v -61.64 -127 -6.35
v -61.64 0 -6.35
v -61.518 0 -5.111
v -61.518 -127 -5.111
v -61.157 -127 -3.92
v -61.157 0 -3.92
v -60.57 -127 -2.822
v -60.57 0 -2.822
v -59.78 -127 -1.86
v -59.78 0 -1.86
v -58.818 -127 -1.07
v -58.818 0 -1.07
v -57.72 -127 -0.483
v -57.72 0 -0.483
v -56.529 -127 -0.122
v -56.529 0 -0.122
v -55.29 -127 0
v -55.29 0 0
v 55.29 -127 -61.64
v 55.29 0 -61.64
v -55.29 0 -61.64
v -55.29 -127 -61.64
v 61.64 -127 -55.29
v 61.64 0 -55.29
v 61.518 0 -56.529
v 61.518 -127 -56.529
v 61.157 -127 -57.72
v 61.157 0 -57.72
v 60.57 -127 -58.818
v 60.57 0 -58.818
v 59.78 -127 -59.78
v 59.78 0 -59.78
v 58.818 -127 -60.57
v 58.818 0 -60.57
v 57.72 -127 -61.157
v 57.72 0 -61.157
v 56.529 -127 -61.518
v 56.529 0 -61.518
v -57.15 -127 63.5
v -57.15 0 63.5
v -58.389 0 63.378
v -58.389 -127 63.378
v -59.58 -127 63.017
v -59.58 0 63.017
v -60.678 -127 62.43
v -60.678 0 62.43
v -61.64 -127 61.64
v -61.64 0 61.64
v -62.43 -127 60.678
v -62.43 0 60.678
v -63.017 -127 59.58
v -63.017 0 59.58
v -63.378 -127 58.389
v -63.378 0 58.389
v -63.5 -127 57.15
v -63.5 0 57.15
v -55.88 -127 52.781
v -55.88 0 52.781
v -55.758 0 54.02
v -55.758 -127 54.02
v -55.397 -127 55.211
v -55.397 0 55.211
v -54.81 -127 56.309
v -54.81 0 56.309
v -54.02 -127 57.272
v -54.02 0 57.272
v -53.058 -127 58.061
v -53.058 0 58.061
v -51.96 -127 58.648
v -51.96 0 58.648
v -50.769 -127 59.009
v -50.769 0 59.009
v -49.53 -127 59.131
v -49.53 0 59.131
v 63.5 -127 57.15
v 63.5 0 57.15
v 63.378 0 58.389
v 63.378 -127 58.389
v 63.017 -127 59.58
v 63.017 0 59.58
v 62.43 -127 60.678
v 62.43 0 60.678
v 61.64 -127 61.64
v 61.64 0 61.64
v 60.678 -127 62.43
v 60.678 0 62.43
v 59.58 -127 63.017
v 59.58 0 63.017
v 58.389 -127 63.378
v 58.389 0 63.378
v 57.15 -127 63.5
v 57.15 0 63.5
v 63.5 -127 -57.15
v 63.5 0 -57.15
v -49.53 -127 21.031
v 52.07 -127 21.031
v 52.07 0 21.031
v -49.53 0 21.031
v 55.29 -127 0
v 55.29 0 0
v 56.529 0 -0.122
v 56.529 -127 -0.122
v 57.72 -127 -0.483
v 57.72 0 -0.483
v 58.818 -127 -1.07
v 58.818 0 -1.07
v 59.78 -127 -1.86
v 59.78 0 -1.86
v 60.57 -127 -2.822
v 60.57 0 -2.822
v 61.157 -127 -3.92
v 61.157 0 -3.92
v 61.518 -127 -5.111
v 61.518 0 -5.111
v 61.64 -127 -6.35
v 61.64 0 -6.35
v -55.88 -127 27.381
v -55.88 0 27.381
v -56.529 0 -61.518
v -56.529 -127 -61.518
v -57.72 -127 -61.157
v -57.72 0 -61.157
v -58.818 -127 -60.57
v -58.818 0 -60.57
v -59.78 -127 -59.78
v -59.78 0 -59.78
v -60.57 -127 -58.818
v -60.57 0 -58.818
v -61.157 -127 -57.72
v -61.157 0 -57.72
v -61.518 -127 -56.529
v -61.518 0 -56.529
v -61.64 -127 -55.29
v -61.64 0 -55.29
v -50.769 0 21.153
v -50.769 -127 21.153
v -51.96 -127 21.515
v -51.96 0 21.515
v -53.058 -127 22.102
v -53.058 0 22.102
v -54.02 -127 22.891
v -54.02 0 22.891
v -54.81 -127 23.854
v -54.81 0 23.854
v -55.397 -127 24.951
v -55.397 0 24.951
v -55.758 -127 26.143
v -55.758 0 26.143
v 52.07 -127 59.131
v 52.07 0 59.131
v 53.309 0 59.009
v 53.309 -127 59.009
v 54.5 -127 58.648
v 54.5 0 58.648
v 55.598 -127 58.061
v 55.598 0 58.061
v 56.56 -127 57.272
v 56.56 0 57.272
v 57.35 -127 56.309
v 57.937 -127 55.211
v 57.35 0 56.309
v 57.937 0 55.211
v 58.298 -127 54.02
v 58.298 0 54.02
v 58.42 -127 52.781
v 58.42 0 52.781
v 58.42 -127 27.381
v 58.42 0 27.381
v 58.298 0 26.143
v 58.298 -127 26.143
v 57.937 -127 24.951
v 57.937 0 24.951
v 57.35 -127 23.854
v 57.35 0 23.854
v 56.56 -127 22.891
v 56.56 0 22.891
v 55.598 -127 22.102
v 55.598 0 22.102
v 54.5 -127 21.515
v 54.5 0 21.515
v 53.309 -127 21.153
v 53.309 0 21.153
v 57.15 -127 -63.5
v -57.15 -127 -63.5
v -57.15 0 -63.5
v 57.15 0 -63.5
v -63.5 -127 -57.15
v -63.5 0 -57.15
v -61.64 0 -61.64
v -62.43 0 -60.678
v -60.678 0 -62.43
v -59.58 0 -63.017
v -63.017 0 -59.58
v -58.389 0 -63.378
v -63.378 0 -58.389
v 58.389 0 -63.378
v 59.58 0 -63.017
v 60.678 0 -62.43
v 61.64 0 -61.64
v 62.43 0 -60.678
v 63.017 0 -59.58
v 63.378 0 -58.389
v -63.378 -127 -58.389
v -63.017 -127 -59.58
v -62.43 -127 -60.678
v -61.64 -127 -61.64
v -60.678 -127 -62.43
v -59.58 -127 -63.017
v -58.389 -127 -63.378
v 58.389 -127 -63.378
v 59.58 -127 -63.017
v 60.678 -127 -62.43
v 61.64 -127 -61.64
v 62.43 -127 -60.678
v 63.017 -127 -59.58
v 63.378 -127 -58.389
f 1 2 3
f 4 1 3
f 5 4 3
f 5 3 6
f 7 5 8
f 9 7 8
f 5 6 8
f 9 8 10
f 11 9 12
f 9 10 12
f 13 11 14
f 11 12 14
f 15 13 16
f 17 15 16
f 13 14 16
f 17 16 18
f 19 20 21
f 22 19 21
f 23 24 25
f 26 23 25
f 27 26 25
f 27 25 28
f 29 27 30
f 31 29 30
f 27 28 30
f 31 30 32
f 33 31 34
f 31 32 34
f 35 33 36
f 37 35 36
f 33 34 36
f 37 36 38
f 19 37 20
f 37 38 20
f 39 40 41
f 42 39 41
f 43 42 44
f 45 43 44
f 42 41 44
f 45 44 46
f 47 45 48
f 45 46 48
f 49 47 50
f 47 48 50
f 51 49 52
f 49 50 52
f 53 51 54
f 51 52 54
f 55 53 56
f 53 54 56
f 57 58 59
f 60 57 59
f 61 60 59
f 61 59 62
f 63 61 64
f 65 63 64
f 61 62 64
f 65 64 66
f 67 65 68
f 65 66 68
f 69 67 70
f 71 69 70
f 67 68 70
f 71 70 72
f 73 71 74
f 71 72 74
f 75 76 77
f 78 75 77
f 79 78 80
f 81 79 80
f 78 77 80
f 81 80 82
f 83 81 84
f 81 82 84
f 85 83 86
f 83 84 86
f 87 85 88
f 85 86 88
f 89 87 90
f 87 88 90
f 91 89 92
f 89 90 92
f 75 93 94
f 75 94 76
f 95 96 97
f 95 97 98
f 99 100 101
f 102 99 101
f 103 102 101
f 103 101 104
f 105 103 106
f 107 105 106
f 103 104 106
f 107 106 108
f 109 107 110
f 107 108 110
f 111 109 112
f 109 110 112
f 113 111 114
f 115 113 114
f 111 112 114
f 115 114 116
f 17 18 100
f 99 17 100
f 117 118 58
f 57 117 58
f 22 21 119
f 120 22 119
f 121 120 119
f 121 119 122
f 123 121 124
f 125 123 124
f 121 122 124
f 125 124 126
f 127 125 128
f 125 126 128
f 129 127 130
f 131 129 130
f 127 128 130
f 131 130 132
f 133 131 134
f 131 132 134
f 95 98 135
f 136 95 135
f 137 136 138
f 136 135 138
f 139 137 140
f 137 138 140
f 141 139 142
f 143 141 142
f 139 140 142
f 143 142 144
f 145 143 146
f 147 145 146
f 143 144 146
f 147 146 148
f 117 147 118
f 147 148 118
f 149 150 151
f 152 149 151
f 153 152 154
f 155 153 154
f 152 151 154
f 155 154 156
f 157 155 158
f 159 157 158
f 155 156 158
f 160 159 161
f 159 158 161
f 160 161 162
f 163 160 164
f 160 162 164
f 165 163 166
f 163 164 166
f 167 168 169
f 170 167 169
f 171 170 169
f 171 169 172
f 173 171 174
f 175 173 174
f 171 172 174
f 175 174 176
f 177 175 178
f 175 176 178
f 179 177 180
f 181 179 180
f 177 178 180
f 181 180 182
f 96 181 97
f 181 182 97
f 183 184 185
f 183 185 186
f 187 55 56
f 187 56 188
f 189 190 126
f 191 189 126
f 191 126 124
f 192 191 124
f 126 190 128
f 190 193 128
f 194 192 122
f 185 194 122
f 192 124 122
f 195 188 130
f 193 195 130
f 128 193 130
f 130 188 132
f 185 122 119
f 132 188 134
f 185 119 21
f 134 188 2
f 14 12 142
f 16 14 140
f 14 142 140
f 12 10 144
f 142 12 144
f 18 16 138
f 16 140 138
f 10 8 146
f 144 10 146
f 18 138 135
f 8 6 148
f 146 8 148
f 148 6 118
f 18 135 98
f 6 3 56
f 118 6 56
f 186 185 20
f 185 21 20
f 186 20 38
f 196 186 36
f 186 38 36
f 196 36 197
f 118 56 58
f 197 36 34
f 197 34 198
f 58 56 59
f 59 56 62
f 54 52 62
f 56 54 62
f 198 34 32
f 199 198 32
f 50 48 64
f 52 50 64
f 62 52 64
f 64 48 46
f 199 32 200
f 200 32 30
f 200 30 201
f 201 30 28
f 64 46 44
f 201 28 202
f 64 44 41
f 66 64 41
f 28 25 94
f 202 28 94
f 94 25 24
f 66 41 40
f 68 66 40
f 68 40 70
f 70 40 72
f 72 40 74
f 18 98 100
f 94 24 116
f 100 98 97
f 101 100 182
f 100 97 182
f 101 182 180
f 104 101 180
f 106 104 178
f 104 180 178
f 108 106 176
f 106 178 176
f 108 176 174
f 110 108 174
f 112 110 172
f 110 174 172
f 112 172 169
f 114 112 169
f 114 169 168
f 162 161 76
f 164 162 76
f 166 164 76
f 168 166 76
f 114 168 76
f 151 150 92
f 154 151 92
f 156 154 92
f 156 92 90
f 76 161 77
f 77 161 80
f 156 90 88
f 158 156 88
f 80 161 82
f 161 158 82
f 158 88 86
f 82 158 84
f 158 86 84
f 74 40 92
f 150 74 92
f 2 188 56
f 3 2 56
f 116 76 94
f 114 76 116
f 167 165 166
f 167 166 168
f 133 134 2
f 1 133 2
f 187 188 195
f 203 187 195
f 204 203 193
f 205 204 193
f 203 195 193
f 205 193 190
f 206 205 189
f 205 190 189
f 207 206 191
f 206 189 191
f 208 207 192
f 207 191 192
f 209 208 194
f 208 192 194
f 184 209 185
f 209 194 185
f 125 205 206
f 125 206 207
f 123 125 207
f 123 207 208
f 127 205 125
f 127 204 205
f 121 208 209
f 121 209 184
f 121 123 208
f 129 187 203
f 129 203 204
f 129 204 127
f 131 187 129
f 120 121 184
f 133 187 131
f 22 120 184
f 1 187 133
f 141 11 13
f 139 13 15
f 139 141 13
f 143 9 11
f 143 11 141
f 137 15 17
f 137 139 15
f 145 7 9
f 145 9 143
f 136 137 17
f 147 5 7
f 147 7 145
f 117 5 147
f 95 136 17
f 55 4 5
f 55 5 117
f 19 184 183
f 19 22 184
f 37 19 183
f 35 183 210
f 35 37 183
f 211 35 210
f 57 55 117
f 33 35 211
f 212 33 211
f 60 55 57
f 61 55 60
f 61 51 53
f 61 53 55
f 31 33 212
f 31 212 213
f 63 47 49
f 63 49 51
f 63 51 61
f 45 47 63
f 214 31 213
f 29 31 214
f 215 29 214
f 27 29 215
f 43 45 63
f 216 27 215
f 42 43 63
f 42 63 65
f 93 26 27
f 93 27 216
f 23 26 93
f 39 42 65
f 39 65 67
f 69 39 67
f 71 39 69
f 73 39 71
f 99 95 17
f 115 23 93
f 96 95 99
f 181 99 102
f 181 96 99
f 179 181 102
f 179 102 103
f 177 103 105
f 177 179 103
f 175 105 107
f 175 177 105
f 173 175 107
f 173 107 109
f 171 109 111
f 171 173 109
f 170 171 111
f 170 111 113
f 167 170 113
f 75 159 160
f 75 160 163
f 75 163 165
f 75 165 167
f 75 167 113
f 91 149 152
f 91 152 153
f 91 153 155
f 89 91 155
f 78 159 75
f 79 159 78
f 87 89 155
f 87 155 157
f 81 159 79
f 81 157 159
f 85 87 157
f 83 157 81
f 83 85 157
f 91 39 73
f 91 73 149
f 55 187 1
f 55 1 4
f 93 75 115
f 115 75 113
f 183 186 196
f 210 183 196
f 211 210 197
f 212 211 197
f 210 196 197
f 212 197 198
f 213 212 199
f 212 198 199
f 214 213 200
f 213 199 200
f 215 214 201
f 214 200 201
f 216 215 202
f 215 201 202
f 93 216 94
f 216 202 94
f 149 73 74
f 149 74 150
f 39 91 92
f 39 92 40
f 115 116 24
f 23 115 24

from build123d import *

# Parameters (mm, degrees)
F1_DEPTH = 127


with BuildPart() as f1:
    # F0 (on Front) → F1 (new body)
    with BuildSketch(Plane.XZ):
        with BuildLine():
            ThreePointArc((63.5, 57.15), (61.640128, 61.640128), (57.15, 63.5))
            Line((57.15, 63.5), (-57.15, 63.5))
            ThreePointArc((-57.15, 63.5), (-61.640128, 61.640128), (-63.5, 57.15))
            Line((-63.5, 57.15), (-63.5, -57.15))
            ThreePointArc((-63.5, -57.15), (-61.640128, -61.640128), (-57.15, -63.5))
            Line((-57.15, -63.5), (57.15, -63.5))
            ThreePointArc((57.15, -63.5), (61.640128, -61.640128), (63.5, -57.15))
            Line((63.5, -57.15), (63.5, 57.15))
        make_face()
        with BuildLine():
            Line((55.290128, -61.640128), (-55.290128, -61.640128))
            ThreePointArc((-55.290128, -61.640128), (-59.780256, -59.780256), (-61.640128, -55.290128))
            Line((-61.640128, -55.290128), (-61.640128, -6.35))
            ThreePointArc((-61.640128, -6.35), (-59.780256, -1.859872), (-55.290128, 0))
            Line((-55.290128, 0), (55.290128, 0))
            ThreePointArc((55.290128, 0), (59.780256, -1.859872), (61.640128, -6.35))
            Line((61.640128, -6.35), (61.640128, -55.290128))
            ThreePointArc((61.640128, -55.290128), (59.780256, -59.780256), (55.290128, -61.640128))
        make_face(mode=Mode.SUBTRACT)
        with BuildLine():
            ThreePointArc((-55.879999, 52.781393), (-54.020127, 57.271521), (-49.529999, 59.131393))
            Line((-49.529999, 59.131393), (52.070001, 59.131393))
            ThreePointArc((52.070001, 59.131393), (56.56013, 57.271521), (58.420001, 52.781393))
            Line((58.420001, 52.781393), (58.420001, 27.381393))
            ThreePointArc((58.420001, 27.381393), (56.56013, 22.891265), (52.070001, 21.031393))
            Line((52.070001, 21.031393), (-49.529999, 21.031393))
            ThreePointArc((-49.529999, 21.031393), (-54.020127, 22.891265), (-55.879999, 27.381393))
            Line((-55.879999, 27.381393), (-55.879999, 52.781393))
        make_face(mode=Mode.SUBTRACT)
    extrude(amount=F1_DEPTH)


solid = f1.part
